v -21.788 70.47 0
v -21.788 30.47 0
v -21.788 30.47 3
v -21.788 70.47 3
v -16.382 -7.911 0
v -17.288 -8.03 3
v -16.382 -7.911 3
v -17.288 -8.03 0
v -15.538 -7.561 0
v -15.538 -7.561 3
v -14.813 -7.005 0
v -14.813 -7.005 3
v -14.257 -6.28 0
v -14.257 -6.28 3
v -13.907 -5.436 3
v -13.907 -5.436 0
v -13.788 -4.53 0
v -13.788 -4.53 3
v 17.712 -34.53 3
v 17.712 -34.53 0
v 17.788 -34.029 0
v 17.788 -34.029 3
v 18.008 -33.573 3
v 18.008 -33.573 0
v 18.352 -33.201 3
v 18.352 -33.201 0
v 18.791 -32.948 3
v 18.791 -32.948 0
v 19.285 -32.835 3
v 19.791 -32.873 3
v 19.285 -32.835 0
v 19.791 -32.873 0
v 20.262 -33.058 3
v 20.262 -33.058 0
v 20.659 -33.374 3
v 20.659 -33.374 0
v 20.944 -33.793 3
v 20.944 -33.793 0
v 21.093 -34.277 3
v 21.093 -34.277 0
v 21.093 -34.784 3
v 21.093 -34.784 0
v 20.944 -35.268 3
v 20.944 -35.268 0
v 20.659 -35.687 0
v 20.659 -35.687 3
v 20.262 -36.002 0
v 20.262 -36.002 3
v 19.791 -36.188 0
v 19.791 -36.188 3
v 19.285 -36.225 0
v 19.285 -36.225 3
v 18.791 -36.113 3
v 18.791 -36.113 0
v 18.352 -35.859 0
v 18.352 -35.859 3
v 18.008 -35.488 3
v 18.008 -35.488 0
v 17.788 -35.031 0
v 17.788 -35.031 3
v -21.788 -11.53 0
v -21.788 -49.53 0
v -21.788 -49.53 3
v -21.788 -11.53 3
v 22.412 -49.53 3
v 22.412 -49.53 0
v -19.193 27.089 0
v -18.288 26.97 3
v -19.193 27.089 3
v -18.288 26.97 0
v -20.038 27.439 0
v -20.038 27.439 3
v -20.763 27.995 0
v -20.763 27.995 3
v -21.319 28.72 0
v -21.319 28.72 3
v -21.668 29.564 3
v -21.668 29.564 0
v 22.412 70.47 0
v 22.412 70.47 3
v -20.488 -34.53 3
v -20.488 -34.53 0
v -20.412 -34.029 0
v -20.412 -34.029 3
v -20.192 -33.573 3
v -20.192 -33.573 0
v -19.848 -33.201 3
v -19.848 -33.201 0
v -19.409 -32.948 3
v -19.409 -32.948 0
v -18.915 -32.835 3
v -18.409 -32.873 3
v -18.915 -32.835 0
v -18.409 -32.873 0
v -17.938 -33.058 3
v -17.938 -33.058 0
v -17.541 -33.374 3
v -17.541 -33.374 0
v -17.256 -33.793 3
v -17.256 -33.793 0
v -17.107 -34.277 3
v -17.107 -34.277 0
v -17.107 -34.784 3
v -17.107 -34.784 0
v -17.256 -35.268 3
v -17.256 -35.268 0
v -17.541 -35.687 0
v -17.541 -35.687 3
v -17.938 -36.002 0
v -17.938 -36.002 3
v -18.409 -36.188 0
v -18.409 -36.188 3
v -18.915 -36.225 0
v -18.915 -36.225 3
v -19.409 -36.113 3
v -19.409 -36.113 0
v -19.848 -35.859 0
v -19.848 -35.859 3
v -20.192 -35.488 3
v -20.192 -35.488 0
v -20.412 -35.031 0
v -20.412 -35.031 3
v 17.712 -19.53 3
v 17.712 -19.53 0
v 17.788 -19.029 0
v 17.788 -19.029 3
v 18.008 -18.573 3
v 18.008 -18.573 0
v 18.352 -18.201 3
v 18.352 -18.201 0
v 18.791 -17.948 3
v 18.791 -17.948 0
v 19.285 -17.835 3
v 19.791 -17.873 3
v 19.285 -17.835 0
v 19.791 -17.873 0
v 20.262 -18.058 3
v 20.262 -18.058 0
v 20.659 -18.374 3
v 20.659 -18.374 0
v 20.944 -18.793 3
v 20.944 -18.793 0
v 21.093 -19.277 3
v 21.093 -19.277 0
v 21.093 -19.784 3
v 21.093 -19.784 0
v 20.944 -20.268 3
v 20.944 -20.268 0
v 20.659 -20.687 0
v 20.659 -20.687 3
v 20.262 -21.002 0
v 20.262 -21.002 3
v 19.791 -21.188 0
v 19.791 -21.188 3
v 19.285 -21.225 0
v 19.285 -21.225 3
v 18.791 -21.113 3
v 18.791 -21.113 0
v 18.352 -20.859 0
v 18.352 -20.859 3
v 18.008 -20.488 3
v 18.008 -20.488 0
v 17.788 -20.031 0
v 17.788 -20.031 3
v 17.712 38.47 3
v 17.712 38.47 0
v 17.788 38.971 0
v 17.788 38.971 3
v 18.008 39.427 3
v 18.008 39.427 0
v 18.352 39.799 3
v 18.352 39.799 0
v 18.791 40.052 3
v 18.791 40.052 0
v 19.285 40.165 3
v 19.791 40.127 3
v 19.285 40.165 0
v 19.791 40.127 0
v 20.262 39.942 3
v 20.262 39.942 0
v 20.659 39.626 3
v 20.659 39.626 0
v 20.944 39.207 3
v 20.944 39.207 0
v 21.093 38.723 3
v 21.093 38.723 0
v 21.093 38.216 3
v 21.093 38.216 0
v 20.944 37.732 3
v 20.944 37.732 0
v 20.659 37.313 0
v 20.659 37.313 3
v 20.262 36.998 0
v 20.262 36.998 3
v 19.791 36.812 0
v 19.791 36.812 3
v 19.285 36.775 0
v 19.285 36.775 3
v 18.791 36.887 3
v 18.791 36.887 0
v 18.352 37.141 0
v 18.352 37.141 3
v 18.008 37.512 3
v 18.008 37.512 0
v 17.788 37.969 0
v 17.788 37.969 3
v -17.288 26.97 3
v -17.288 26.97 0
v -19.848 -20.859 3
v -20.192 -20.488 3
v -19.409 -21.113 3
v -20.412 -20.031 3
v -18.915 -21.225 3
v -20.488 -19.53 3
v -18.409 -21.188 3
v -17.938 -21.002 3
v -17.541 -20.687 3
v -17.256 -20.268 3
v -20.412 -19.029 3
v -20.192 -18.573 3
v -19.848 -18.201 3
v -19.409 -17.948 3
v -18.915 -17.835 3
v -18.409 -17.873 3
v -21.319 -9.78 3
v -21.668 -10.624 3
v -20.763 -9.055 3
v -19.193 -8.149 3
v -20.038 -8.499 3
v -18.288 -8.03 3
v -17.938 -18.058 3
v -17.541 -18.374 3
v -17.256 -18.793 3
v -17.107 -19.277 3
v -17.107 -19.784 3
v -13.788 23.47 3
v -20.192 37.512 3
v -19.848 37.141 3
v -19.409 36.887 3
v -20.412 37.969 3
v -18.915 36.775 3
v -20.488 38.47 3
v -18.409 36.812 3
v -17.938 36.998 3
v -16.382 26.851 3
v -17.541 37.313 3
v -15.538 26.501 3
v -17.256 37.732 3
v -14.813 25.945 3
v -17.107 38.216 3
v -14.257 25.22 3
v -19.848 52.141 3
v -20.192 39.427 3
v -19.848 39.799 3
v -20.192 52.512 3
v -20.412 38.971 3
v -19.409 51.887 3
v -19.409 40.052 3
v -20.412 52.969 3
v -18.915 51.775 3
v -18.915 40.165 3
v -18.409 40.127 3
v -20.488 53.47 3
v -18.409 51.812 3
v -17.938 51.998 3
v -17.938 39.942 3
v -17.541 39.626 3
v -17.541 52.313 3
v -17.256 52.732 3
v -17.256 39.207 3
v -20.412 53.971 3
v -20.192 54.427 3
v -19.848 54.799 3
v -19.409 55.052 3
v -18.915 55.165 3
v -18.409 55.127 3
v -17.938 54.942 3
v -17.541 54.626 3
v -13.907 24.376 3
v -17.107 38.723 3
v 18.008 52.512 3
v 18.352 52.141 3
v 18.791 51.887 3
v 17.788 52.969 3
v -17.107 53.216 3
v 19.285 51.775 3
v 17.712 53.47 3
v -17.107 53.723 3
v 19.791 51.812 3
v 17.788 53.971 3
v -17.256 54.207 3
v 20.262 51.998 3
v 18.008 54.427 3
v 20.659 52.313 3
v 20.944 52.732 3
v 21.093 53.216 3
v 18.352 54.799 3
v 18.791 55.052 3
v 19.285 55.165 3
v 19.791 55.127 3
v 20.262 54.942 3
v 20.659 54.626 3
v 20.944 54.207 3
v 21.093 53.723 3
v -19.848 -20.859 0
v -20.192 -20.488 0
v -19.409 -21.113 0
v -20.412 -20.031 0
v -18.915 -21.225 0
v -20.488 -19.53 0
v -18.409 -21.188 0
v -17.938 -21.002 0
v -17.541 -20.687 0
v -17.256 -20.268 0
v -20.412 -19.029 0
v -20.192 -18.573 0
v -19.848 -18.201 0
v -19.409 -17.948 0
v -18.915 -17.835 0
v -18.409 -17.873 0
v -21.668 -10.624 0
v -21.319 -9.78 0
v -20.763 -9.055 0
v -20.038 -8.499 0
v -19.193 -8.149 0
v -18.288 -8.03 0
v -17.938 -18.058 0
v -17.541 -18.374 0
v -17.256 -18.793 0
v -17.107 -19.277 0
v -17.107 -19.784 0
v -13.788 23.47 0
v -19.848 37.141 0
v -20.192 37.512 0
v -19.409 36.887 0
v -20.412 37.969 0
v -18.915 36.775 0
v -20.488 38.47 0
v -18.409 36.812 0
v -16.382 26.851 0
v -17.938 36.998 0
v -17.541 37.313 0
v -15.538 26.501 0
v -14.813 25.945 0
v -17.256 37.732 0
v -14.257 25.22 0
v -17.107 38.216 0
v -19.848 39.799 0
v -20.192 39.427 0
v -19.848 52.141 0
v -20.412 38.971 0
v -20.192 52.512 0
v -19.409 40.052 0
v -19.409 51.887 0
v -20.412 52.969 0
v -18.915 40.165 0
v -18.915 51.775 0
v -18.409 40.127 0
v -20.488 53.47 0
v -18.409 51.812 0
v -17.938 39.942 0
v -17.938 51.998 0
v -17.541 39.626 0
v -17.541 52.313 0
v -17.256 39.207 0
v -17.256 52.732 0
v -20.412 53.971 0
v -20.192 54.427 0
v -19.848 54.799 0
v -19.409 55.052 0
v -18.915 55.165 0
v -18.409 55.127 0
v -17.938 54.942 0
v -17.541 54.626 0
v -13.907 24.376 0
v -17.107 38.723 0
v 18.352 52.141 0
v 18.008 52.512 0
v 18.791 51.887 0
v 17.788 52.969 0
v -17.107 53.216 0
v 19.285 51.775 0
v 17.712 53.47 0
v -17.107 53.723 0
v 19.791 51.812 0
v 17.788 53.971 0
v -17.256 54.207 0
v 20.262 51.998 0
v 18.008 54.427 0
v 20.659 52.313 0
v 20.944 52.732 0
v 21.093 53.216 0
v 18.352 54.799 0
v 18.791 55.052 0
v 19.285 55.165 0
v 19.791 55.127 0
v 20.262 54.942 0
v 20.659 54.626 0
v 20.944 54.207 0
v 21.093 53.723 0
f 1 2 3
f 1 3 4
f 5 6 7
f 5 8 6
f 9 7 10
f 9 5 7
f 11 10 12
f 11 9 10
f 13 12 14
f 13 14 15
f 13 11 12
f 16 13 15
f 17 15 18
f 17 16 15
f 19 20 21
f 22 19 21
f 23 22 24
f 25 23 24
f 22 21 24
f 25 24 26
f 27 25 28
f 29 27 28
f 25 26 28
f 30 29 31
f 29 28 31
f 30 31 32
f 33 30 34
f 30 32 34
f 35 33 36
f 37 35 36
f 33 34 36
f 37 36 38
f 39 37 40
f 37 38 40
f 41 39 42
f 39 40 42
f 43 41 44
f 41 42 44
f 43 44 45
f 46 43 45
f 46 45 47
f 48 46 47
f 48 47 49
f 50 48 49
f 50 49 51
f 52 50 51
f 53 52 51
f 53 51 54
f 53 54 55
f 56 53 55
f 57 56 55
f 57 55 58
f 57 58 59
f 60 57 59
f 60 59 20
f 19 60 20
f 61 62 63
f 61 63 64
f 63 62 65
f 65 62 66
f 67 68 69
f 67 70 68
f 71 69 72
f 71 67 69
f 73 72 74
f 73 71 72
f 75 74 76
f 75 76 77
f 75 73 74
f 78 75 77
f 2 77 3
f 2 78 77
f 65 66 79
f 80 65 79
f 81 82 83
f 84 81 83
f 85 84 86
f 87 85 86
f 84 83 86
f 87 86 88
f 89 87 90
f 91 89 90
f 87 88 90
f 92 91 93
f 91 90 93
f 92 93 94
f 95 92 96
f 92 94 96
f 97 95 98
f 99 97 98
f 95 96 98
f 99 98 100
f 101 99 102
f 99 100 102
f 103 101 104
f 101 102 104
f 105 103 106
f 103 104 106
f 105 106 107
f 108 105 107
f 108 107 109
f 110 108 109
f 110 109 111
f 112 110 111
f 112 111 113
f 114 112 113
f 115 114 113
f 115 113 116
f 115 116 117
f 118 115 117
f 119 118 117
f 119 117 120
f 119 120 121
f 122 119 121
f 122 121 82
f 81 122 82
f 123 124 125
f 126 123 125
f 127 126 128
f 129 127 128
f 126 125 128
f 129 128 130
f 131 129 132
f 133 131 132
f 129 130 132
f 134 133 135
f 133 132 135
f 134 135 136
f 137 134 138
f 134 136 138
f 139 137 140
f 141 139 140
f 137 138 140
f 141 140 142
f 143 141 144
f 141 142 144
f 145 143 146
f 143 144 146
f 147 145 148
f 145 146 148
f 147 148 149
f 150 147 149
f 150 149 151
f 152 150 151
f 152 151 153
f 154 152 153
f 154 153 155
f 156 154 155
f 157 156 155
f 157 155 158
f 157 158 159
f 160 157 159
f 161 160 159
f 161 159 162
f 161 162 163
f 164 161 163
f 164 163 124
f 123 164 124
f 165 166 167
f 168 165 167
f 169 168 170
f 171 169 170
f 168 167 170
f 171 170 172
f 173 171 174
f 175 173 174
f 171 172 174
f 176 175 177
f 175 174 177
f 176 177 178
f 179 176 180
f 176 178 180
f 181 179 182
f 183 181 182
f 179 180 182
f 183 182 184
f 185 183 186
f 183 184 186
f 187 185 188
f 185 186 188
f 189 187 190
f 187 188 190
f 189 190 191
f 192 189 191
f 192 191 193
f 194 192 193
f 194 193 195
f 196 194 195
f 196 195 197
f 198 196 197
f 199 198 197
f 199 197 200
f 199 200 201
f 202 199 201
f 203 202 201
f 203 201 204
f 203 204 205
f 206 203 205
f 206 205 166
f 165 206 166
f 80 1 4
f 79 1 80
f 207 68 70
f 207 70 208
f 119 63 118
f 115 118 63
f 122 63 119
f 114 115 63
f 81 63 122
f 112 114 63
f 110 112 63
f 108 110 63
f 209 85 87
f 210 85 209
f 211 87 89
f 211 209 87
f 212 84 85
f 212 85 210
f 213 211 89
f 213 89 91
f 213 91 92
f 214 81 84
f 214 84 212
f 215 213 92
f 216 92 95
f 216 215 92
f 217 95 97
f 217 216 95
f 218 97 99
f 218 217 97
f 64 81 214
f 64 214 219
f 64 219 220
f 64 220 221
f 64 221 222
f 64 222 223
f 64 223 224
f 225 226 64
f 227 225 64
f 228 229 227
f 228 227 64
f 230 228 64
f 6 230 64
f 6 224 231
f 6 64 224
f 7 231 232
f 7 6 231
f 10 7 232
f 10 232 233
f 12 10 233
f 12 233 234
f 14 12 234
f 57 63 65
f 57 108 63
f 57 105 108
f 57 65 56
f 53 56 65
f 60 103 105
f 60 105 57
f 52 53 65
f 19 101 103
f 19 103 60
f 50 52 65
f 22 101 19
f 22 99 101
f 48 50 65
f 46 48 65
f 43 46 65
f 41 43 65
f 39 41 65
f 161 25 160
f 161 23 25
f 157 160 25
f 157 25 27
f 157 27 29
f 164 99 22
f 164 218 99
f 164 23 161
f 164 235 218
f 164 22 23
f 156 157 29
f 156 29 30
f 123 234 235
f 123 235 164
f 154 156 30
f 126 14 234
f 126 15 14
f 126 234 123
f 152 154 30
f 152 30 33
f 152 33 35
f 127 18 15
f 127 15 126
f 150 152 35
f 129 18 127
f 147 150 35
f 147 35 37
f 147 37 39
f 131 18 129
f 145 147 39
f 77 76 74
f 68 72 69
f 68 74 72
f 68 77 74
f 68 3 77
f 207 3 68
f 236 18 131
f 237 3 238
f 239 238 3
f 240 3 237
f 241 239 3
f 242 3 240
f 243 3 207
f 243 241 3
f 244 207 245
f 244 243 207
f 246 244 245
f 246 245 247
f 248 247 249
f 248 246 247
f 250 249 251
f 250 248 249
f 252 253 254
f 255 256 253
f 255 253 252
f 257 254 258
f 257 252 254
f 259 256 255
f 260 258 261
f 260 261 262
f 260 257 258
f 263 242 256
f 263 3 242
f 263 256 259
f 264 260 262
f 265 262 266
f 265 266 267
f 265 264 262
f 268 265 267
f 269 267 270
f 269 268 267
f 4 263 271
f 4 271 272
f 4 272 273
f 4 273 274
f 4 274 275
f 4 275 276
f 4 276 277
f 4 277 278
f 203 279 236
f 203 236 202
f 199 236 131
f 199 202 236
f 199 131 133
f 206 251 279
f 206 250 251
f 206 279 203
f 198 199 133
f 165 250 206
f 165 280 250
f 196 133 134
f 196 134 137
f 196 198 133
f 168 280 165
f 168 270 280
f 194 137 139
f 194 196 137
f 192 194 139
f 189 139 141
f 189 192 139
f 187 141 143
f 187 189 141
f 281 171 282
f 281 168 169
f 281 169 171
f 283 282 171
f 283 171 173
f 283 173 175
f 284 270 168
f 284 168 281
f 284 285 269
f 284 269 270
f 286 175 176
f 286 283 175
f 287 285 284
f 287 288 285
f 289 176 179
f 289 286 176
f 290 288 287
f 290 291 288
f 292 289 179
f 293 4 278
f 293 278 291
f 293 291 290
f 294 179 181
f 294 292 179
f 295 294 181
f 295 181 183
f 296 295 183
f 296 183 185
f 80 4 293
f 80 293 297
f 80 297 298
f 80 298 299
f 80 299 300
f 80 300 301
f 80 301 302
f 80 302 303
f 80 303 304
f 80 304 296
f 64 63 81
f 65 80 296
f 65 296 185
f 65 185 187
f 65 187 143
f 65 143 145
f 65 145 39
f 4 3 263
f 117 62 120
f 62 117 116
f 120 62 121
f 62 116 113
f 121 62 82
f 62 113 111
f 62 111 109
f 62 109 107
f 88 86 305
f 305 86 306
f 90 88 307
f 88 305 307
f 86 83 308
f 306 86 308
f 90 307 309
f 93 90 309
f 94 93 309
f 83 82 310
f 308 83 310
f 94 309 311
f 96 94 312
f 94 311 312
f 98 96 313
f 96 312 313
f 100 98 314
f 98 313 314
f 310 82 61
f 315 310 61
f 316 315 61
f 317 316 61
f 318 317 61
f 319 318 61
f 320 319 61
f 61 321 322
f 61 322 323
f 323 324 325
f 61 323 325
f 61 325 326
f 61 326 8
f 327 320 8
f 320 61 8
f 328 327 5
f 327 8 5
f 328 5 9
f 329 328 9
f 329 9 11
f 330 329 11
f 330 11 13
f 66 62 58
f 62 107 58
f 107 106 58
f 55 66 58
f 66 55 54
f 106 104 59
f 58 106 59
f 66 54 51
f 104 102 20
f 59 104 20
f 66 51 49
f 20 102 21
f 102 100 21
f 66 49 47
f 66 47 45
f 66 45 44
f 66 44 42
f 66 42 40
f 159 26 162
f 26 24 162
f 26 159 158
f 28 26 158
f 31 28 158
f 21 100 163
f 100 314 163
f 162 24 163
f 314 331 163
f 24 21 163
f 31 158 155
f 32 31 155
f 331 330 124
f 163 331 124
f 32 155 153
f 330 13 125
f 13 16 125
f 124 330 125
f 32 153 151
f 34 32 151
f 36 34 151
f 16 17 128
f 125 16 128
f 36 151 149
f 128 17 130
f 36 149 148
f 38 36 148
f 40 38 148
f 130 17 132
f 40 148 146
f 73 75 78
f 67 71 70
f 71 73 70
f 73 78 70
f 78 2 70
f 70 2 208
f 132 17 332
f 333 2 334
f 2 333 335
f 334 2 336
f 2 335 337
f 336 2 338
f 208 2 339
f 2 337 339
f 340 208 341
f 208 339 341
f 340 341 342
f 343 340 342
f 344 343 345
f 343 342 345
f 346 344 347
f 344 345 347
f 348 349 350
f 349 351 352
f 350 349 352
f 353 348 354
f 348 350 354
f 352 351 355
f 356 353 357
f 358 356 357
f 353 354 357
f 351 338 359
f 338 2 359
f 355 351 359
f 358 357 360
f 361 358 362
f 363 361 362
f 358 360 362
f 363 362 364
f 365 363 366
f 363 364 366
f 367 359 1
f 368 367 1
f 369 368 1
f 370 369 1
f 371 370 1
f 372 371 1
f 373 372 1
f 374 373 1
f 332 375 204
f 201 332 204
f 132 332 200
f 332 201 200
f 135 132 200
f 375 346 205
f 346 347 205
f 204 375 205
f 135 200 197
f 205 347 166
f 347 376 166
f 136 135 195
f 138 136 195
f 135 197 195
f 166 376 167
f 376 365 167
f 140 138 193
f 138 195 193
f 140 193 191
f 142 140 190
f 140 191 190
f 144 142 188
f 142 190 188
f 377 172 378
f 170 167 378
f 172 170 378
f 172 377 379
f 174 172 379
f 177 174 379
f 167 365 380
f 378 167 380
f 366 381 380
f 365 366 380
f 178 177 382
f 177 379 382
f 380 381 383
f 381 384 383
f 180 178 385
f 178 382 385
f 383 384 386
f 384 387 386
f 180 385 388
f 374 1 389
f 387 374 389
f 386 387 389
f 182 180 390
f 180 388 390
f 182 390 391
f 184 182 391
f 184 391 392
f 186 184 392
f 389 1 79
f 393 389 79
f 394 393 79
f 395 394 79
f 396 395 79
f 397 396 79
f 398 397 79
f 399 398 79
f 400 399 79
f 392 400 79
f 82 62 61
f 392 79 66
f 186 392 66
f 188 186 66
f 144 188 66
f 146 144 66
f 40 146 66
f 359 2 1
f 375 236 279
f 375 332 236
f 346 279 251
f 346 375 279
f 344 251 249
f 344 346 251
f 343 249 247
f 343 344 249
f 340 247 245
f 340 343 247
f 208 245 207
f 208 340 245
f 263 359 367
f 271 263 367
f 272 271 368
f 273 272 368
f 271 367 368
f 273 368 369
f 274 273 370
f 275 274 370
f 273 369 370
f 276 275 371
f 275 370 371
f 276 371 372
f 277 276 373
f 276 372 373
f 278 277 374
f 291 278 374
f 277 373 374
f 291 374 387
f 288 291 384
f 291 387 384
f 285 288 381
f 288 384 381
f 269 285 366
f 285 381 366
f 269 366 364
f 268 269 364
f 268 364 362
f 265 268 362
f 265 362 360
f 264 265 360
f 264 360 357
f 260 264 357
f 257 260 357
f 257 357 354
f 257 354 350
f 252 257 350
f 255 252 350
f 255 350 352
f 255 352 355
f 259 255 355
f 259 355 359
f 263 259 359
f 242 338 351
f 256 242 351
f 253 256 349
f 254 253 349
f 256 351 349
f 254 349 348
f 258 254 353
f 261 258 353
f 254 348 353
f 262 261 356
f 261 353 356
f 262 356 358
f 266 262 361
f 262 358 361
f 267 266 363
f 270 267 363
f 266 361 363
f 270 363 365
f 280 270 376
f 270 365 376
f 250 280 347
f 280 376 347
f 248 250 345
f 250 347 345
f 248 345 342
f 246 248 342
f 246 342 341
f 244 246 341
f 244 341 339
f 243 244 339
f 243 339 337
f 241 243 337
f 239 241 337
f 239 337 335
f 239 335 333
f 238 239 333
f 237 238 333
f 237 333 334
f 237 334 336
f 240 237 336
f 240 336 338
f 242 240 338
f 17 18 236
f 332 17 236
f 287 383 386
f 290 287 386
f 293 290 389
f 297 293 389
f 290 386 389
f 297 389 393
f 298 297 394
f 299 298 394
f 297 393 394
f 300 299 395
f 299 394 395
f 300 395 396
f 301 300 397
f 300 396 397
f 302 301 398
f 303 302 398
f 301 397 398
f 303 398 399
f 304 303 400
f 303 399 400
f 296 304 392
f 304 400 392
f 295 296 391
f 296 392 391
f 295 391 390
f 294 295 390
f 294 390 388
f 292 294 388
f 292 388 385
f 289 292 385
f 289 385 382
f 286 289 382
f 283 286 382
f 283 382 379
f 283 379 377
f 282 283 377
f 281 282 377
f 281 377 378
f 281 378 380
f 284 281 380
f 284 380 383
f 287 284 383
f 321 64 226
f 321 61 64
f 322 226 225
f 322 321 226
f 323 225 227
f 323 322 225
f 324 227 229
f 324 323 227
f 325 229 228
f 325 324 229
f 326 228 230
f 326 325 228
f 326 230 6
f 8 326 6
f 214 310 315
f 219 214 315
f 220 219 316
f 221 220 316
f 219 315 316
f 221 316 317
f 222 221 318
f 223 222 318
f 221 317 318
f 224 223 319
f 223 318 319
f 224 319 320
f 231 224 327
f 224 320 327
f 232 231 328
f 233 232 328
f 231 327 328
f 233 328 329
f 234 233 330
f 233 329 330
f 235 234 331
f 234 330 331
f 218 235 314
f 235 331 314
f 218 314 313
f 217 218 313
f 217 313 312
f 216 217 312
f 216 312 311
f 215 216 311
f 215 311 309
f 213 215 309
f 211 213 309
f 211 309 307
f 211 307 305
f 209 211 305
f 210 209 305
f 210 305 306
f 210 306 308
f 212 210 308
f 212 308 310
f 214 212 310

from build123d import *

# Parameters (mm, degrees)
SKETCH_D_W               = 44.2
SKETCH_D_H               = 120
BOSS_EXTRUDE1_DEPTH      = 3
M3_CLEARANCE_HOLE1_D     = 3.4
M3_CLEARANCE_HOLE1_DEPTH = 15
M3_CLEARANCE_HOLE1_TIP   = 1.021463052
SKETCH6_W                = 8
SKETCH6_H                = 35
CUT_EXTRUDE1_DEPTH       = 75.008813719
FILLET1_R                = 3.5


with BuildPart() as part:
    # Sketch d → Boss-Extrude1 (new body)
    with BuildSketch(Plane.XY):
        with Locations((0.312368929, 10.469782369)):
            Rectangle(SKETCH_D_W, SKETCH_D_H)
    extrude(amount=BOSS_EXTRUDE1_DEPTH)

    # M3 Clearance Hole1
    with Locations(Plane.XY.offset(3)):
        with Locations((-18.787631071, 53.469782369), (-18.787631071, 38.469782369), (-18.787631071, -19.530217631), (-18.787631071, -34.530217631), (19.412368929, -34.530217631), (19.412368929, -19.530217631), (19.412368929, 38.469782369), (19.412368929, 53.469782369)):
            Hole(M3_CLEARANCE_HOLE1_D / 2, depth=M3_CLEARANCE_HOLE1_DEPTH)
            with Locations((0, 0, -(M3_CLEARANCE_HOLE1_DEPTH + M3_CLEARANCE_HOLE1_TIP / 2))):  # 118° drill point
                Cone(0, M3_CLEARANCE_HOLE1_D / 2, M3_CLEARANCE_HOLE1_TIP, mode=Mode.SUBTRACT)

    # Sketch6 → Cut-Extrude1 (cut, through all)
    with BuildSketch(Plane.XY.offset(3)):
        with Locations((-17.787631071, 9.469782369)):
            Rectangle(SKETCH6_W, SKETCH6_H)
    extrude(amount=-CUT_EXTRUDE1_DEPTH, mode=Mode.SUBTRACT)

    # Fillet1
    fillet1_edges = [part.edges().sort_by_distance(p)[0] for p in [
        (-21.787631071, -8.030217631, 1.5),
        (-21.787631071, 26.969782369, 1.5),
        (-13.787631071, 26.969782369, 1.5),
        (-13.787631071, -8.030217631, 1.5),
    ]]
    fillet(fillet1_edges, radius=FILLET1_R)


solid = part.part
